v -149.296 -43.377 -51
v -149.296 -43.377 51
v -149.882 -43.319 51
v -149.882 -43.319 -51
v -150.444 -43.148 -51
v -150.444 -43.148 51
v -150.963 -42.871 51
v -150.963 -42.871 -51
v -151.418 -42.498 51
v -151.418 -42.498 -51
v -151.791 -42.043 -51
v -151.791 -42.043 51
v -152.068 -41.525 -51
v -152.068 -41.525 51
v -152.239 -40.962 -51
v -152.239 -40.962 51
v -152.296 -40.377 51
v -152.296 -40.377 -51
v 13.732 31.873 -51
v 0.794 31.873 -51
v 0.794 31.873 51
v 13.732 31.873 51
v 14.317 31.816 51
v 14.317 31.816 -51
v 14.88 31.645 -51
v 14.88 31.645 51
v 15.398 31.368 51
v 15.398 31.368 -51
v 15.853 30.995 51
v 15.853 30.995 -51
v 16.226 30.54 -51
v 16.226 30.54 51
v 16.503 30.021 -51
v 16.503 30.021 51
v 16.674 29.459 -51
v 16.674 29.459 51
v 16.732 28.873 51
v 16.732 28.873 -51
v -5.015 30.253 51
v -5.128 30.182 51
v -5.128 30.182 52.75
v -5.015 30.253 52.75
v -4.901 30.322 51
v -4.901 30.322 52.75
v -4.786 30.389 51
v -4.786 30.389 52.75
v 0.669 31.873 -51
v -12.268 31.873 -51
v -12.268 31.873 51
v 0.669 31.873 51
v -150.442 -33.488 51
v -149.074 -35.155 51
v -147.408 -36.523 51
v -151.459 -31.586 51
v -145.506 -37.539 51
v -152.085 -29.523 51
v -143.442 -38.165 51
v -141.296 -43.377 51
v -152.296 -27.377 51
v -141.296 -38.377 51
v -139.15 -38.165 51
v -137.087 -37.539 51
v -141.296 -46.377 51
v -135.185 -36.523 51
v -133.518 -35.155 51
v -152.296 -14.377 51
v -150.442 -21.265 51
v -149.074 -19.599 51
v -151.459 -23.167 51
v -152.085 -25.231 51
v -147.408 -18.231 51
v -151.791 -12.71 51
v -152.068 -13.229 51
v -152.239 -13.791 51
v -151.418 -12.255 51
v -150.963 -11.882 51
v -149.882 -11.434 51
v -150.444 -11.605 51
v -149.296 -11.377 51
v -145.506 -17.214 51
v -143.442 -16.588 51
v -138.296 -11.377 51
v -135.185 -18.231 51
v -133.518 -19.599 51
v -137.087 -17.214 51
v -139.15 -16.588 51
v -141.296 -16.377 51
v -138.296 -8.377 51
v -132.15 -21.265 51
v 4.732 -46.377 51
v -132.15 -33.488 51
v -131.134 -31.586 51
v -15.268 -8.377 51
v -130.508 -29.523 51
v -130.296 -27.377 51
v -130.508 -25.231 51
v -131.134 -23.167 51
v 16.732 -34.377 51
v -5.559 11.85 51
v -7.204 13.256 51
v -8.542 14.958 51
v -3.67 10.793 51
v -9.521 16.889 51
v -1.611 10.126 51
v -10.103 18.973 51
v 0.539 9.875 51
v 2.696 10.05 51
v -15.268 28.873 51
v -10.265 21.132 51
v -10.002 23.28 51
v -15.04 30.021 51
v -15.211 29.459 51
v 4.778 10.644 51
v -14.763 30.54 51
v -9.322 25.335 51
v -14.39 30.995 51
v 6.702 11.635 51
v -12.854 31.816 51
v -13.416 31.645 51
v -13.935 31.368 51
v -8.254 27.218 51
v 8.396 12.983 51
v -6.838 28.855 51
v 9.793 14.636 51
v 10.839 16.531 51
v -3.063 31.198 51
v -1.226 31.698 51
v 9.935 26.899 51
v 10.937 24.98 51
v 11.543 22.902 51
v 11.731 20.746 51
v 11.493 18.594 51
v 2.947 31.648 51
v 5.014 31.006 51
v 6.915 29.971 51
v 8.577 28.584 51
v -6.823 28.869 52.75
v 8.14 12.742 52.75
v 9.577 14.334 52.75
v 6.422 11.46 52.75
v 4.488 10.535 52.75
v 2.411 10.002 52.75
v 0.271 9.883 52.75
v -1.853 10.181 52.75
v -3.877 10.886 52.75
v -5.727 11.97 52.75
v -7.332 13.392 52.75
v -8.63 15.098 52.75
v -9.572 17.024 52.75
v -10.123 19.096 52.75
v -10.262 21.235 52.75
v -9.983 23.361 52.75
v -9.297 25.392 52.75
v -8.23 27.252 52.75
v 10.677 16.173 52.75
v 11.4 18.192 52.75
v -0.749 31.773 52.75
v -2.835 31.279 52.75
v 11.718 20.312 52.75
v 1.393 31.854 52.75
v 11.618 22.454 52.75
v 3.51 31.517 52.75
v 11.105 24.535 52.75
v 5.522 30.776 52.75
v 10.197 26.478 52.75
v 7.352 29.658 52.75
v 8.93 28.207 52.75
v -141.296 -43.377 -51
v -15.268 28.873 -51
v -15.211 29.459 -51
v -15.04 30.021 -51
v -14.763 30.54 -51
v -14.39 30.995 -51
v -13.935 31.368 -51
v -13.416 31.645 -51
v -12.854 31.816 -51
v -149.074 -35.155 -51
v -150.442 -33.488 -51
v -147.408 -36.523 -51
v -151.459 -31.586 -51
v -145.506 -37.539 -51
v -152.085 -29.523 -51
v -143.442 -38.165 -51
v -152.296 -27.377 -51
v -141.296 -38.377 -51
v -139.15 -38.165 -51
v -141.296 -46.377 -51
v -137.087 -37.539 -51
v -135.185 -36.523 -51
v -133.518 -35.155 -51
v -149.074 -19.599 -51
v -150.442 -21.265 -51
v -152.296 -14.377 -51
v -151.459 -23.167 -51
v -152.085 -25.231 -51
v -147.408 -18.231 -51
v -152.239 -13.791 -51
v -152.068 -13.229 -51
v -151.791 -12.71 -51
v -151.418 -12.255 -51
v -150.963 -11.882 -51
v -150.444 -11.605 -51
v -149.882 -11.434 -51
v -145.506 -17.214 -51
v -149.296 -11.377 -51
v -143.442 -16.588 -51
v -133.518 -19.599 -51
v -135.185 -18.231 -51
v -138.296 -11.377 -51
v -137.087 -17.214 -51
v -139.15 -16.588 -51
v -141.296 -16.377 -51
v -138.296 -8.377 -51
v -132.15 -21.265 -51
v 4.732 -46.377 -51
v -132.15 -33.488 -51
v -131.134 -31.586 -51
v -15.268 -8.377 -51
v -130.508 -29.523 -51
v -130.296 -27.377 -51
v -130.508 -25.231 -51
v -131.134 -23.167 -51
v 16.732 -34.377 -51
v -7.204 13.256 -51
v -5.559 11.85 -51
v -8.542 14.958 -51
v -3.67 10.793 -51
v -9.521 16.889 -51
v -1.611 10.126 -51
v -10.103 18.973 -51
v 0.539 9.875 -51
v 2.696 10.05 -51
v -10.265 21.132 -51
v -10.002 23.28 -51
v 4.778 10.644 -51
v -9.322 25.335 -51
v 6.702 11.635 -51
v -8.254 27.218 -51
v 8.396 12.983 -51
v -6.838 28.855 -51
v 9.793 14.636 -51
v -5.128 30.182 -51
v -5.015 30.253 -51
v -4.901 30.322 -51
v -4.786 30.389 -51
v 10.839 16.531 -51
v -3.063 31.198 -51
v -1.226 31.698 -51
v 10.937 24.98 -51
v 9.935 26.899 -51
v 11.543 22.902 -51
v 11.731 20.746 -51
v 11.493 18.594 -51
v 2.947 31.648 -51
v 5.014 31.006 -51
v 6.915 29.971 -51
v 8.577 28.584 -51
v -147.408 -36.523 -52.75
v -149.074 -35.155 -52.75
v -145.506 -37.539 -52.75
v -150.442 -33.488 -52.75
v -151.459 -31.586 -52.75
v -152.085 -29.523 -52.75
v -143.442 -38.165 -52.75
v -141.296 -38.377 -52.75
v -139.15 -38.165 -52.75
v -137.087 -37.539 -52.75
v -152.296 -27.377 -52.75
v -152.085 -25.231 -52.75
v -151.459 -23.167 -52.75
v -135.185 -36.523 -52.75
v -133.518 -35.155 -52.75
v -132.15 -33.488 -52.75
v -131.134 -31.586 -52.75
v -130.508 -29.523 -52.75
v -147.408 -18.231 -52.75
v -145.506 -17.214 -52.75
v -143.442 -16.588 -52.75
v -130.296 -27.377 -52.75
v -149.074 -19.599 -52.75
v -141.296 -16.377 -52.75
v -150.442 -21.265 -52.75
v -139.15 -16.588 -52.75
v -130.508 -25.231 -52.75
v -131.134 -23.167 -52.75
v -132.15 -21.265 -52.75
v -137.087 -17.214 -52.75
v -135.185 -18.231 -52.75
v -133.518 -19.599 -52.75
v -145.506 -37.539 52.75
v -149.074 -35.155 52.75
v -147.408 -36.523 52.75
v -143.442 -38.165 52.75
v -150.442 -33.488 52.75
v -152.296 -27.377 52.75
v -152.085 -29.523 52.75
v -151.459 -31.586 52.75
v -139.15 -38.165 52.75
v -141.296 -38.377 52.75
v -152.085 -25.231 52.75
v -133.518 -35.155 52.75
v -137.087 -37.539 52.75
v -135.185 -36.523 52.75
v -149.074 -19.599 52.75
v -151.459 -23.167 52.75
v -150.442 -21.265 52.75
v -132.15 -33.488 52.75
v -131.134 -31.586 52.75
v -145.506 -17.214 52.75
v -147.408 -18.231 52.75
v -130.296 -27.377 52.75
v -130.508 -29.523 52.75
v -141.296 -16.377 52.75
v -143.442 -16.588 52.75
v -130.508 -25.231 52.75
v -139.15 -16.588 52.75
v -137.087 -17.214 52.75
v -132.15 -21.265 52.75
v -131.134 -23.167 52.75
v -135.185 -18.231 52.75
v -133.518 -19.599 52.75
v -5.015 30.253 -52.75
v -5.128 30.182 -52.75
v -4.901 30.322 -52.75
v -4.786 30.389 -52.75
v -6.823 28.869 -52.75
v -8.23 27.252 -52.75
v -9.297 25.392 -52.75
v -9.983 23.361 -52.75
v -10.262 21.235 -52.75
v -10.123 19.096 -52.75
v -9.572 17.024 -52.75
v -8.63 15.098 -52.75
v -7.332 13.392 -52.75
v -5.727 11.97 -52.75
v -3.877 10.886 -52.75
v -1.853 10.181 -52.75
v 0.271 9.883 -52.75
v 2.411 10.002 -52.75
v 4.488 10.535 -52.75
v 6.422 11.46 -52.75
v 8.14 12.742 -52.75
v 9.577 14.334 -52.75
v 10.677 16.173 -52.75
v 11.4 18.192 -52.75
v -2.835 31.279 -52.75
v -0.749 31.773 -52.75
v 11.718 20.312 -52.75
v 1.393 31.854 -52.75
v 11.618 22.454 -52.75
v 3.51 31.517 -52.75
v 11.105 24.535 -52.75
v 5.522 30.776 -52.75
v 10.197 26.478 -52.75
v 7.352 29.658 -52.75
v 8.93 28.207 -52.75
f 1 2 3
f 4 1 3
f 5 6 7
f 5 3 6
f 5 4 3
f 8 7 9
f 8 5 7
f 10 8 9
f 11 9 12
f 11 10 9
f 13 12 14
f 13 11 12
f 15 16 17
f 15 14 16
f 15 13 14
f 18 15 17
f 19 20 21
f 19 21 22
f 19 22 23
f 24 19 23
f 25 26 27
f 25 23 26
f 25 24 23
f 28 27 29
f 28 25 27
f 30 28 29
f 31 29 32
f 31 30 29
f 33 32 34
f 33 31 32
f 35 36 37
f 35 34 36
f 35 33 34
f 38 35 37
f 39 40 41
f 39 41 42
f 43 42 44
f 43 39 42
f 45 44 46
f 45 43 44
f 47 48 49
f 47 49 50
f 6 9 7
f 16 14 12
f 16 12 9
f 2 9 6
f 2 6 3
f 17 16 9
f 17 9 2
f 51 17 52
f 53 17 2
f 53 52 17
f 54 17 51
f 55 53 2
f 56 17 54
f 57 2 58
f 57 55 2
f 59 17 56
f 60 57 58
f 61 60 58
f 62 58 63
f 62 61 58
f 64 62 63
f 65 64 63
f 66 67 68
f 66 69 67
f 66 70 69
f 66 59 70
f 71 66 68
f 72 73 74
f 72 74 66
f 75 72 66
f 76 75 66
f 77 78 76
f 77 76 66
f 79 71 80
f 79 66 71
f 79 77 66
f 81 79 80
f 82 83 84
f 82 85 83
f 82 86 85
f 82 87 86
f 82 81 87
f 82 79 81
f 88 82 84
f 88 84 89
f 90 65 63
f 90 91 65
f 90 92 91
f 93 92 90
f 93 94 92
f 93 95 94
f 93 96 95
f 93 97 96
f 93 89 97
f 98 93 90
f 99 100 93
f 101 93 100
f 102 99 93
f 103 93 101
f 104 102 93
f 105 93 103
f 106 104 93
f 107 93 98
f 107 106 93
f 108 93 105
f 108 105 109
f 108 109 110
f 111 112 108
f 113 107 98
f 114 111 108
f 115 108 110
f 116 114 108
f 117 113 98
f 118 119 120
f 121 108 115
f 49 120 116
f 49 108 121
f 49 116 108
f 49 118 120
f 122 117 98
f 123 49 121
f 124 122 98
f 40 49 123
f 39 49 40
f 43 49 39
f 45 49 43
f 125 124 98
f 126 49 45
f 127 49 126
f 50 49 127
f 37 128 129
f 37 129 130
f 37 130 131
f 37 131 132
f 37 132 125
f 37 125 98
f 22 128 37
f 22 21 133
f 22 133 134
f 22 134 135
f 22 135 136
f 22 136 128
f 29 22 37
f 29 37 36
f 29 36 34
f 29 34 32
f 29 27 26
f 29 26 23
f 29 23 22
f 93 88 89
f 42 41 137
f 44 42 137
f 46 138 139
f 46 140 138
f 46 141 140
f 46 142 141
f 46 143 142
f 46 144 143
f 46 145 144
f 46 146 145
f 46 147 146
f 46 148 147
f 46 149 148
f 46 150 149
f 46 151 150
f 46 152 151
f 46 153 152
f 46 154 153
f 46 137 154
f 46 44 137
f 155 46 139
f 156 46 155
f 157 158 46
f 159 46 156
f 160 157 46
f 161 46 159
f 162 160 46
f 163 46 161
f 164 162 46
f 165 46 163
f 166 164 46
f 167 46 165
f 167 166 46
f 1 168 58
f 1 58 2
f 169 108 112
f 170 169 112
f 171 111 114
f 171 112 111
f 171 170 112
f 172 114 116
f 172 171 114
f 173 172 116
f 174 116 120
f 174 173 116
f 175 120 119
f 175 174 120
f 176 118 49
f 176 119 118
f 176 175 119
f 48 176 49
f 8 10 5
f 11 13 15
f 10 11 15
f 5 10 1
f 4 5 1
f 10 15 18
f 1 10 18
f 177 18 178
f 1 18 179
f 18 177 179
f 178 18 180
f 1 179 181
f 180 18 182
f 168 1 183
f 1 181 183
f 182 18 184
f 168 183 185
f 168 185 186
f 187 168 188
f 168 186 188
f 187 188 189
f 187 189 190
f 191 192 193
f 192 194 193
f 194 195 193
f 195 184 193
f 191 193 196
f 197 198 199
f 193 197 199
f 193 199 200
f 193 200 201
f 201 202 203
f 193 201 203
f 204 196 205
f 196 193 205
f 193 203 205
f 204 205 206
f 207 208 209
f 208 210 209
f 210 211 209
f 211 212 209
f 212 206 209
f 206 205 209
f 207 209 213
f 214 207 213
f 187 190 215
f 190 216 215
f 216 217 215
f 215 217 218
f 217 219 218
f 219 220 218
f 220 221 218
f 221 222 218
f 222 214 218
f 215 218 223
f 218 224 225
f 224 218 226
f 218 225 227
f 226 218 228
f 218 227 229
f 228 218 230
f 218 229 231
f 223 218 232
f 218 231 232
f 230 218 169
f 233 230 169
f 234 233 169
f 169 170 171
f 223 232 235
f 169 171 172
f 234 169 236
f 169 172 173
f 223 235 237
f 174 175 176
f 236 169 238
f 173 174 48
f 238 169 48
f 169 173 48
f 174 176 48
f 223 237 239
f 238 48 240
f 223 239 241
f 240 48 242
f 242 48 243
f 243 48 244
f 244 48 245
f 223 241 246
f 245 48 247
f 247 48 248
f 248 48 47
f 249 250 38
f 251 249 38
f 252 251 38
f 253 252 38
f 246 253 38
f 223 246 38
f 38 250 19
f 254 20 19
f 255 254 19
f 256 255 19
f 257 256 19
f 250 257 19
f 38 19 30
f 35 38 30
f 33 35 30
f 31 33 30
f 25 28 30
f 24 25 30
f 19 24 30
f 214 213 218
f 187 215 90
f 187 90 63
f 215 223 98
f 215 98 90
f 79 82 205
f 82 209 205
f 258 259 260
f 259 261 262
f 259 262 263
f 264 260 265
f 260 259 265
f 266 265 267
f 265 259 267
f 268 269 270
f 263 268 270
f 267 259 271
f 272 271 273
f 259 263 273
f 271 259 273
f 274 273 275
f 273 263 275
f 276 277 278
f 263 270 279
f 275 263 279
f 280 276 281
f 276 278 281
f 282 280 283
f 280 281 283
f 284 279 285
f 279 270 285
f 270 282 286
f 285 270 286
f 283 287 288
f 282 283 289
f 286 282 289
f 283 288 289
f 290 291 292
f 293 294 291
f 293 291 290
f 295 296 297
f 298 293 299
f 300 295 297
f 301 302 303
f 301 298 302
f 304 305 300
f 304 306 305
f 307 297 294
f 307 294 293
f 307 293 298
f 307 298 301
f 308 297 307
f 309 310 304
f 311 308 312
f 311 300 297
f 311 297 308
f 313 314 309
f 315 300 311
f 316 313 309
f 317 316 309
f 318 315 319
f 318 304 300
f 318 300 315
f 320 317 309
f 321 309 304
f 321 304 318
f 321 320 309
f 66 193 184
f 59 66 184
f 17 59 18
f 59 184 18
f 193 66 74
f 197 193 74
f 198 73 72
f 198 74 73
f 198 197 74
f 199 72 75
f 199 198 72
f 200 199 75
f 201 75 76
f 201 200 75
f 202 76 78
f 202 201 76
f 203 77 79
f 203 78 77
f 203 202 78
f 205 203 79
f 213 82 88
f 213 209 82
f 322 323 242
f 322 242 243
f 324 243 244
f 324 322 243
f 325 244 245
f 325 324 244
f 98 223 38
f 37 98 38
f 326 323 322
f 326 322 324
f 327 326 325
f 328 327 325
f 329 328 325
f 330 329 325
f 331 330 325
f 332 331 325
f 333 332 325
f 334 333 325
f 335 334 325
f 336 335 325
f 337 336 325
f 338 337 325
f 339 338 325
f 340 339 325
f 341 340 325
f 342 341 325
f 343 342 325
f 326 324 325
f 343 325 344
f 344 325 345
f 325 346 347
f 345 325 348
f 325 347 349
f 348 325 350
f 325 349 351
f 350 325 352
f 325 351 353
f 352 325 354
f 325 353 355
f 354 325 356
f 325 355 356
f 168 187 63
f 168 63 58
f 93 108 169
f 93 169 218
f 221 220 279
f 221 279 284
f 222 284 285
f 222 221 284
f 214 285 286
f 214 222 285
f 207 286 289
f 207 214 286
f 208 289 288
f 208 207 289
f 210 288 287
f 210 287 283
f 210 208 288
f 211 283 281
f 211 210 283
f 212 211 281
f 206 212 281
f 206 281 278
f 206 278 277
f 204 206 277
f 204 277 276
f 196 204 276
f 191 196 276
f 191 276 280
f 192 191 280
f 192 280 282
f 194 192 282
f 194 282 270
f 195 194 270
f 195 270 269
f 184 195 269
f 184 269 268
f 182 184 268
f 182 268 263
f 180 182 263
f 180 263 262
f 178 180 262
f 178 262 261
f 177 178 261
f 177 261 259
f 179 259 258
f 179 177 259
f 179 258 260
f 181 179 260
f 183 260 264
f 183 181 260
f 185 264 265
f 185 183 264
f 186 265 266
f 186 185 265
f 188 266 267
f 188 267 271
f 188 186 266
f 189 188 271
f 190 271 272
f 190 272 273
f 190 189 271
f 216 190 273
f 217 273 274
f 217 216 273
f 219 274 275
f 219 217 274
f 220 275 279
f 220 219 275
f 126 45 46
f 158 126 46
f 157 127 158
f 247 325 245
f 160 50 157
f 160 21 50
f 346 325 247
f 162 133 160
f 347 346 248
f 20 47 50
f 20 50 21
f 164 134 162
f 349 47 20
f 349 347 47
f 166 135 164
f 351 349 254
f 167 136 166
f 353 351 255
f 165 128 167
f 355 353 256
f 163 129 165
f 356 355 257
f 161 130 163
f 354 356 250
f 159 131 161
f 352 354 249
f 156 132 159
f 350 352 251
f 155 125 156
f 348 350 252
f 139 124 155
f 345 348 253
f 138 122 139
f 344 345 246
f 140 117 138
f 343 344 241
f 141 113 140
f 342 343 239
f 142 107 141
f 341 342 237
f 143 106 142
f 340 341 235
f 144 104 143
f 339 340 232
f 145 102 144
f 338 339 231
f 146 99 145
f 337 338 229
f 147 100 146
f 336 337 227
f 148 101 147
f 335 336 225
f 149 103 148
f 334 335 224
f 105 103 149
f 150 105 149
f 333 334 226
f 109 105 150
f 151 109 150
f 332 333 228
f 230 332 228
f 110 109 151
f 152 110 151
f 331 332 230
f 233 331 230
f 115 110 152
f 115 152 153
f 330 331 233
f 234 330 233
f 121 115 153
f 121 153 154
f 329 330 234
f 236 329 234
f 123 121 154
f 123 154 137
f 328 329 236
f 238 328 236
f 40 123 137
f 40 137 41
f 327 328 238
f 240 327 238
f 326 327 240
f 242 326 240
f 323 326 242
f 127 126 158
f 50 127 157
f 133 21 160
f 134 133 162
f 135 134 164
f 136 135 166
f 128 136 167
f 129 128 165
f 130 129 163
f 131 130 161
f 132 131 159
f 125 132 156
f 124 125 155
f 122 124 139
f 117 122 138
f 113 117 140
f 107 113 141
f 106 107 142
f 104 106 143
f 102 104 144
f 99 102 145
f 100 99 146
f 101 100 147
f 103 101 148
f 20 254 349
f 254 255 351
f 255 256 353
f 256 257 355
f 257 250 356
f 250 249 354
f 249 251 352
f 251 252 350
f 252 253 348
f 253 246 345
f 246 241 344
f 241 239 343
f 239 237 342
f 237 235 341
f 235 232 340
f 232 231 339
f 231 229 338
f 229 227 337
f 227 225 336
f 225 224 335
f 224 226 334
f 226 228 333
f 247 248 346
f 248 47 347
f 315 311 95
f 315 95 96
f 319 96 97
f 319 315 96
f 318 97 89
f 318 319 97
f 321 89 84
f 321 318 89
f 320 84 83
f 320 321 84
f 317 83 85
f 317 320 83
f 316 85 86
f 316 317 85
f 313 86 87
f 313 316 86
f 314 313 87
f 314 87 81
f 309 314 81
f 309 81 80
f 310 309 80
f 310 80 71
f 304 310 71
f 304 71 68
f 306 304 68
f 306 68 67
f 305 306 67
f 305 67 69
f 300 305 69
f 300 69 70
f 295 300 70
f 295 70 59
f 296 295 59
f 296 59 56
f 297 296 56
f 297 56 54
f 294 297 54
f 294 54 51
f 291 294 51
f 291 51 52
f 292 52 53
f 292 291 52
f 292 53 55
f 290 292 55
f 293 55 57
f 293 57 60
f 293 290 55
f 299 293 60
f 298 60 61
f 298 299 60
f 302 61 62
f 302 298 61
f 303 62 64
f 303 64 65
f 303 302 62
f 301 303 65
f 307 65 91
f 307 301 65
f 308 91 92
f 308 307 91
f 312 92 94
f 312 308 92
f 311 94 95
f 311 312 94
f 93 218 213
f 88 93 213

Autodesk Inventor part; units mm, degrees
ref_plane "YZ Plane" through (0, 0, 0) normal (1, 0, 0) x (0, 1, 0)
ref_plane "XZ Plane" through (0, 0, 0) normal (0, 1, 0) x (-1, 0, 0)
ref_plane "XY Plane" through (0, 0, 0) normal (0, 0, 1) x (1, 0, 0)
sketch "Sketch1" plane through (0, 0, 0) normal (0, 0, 1) x (1, 0, 0)
  arc A0 (-5.1284, 30.1824) -> (-4.7861, 30.3893) centre (0.7317, 20.8733) ccw
  circle A1 centre (0.7317, 20.8733) radius 11
  circle A2 centre (-141.2963, -27.3767) radius 11
  line L0 (-141.2963, -27.3767) -> (0.7317, -27.3767)
  line L1 (0.7317, -27.3767) -> (0.7317, 20.8733)
  line L2 (-70.2823, -27.3767) -> (-70.2823, -8.3767)
  line L3 (-70.2823, -27.3767) -> (-70.2823, -46.3767)
  line L4 (-141.2963, -11.3767) -> (-149.2963, -11.3767)
  line L5 (-152.2963, -14.3767) -> (-152.2963, -27.3767)
  line L6 (-152.2963, -27.3767) -> (-152.2963, -40.3767)
  line L7 (-141.2963, -11.3767) -> (-138.2963, -11.3767)
  line L8 (-138.2963, -11.3767) -> (-138.2963, -8.3767)
  line L9 (-138.2963, -8.3767) -> (-70.2823, -8.3767)
  line L10 (-141.2963, -46.3767) -> (-70.2823, -46.3767)
  line L11 (-12.2683, 31.8733) -> (13.7317, 31.8733)
  line L12 (4.7317, -46.3767) -> (-70.2823, -46.3767)
  line L13 (-15.2683, -8.3767) -> (-70.2823, -8.3767)
  line L14 (-141.2963, -46.3767) -> (-141.2963, -43.3767)
  line L15 (-141.2963, -43.3767) -> (-149.2963, -43.3767)
  line L16 (-15.2683, 20.8733) -> (-15.2683, -8.3767)
  line L17 (-15.2683, 20.8733) -> (-15.2683, 28.8733)
  line L18 (-12.2683, 31.8733) -> (-12.2683, 31.8733)
  line L19 (16.7317, 20.8733) -> (16.7317, 28.8733)
  line L20 (16.7317, 20.8733) -> (16.7317, -34.3767)
  line L21 (16.7317, -34.3767) -> (4.7317, -46.3767)
  arc A3 (-149.2963, -11.3767) -> (-152.2963, -14.3767) centre (-149.2963, -14.3767) ccw
  arc A4 (-152.2963, -40.3767) -> (-149.2963, -43.3767) centre (-149.2963, -40.3767) ccw
  arc A5 (-12.2683, 31.8733) -> (-15.2683, 28.8733) centre (-12.2683, 28.8733) ccw
  arc A6 (16.7317, 28.8733) -> (13.7317, 31.8733) centre (13.7317, 28.8733) ccw
  point P0 (16.7317, -46.3767)
  dimension "d8" = 22
  dimension "d9" = 19
  dimension "d10" = 16
  dimension "d12" = 19
  dimension "d15" = 3
  dimension "d17" = 16
  dimension "d18" = 16
  dimension "d19" = 12
  dimension "d20" = 12
  dimension "d21" = 3
  dimension "d22" = 3
extrude "Extrusion1" add sketch "Sketch1" along normal mid plane 102
extrude "Extrusion4" add sketch "Sketch1" along normal mid plane 105.5 contours A1 A0 | A2
equation "\"d20\" = d19"
properties part number "Bicep"
